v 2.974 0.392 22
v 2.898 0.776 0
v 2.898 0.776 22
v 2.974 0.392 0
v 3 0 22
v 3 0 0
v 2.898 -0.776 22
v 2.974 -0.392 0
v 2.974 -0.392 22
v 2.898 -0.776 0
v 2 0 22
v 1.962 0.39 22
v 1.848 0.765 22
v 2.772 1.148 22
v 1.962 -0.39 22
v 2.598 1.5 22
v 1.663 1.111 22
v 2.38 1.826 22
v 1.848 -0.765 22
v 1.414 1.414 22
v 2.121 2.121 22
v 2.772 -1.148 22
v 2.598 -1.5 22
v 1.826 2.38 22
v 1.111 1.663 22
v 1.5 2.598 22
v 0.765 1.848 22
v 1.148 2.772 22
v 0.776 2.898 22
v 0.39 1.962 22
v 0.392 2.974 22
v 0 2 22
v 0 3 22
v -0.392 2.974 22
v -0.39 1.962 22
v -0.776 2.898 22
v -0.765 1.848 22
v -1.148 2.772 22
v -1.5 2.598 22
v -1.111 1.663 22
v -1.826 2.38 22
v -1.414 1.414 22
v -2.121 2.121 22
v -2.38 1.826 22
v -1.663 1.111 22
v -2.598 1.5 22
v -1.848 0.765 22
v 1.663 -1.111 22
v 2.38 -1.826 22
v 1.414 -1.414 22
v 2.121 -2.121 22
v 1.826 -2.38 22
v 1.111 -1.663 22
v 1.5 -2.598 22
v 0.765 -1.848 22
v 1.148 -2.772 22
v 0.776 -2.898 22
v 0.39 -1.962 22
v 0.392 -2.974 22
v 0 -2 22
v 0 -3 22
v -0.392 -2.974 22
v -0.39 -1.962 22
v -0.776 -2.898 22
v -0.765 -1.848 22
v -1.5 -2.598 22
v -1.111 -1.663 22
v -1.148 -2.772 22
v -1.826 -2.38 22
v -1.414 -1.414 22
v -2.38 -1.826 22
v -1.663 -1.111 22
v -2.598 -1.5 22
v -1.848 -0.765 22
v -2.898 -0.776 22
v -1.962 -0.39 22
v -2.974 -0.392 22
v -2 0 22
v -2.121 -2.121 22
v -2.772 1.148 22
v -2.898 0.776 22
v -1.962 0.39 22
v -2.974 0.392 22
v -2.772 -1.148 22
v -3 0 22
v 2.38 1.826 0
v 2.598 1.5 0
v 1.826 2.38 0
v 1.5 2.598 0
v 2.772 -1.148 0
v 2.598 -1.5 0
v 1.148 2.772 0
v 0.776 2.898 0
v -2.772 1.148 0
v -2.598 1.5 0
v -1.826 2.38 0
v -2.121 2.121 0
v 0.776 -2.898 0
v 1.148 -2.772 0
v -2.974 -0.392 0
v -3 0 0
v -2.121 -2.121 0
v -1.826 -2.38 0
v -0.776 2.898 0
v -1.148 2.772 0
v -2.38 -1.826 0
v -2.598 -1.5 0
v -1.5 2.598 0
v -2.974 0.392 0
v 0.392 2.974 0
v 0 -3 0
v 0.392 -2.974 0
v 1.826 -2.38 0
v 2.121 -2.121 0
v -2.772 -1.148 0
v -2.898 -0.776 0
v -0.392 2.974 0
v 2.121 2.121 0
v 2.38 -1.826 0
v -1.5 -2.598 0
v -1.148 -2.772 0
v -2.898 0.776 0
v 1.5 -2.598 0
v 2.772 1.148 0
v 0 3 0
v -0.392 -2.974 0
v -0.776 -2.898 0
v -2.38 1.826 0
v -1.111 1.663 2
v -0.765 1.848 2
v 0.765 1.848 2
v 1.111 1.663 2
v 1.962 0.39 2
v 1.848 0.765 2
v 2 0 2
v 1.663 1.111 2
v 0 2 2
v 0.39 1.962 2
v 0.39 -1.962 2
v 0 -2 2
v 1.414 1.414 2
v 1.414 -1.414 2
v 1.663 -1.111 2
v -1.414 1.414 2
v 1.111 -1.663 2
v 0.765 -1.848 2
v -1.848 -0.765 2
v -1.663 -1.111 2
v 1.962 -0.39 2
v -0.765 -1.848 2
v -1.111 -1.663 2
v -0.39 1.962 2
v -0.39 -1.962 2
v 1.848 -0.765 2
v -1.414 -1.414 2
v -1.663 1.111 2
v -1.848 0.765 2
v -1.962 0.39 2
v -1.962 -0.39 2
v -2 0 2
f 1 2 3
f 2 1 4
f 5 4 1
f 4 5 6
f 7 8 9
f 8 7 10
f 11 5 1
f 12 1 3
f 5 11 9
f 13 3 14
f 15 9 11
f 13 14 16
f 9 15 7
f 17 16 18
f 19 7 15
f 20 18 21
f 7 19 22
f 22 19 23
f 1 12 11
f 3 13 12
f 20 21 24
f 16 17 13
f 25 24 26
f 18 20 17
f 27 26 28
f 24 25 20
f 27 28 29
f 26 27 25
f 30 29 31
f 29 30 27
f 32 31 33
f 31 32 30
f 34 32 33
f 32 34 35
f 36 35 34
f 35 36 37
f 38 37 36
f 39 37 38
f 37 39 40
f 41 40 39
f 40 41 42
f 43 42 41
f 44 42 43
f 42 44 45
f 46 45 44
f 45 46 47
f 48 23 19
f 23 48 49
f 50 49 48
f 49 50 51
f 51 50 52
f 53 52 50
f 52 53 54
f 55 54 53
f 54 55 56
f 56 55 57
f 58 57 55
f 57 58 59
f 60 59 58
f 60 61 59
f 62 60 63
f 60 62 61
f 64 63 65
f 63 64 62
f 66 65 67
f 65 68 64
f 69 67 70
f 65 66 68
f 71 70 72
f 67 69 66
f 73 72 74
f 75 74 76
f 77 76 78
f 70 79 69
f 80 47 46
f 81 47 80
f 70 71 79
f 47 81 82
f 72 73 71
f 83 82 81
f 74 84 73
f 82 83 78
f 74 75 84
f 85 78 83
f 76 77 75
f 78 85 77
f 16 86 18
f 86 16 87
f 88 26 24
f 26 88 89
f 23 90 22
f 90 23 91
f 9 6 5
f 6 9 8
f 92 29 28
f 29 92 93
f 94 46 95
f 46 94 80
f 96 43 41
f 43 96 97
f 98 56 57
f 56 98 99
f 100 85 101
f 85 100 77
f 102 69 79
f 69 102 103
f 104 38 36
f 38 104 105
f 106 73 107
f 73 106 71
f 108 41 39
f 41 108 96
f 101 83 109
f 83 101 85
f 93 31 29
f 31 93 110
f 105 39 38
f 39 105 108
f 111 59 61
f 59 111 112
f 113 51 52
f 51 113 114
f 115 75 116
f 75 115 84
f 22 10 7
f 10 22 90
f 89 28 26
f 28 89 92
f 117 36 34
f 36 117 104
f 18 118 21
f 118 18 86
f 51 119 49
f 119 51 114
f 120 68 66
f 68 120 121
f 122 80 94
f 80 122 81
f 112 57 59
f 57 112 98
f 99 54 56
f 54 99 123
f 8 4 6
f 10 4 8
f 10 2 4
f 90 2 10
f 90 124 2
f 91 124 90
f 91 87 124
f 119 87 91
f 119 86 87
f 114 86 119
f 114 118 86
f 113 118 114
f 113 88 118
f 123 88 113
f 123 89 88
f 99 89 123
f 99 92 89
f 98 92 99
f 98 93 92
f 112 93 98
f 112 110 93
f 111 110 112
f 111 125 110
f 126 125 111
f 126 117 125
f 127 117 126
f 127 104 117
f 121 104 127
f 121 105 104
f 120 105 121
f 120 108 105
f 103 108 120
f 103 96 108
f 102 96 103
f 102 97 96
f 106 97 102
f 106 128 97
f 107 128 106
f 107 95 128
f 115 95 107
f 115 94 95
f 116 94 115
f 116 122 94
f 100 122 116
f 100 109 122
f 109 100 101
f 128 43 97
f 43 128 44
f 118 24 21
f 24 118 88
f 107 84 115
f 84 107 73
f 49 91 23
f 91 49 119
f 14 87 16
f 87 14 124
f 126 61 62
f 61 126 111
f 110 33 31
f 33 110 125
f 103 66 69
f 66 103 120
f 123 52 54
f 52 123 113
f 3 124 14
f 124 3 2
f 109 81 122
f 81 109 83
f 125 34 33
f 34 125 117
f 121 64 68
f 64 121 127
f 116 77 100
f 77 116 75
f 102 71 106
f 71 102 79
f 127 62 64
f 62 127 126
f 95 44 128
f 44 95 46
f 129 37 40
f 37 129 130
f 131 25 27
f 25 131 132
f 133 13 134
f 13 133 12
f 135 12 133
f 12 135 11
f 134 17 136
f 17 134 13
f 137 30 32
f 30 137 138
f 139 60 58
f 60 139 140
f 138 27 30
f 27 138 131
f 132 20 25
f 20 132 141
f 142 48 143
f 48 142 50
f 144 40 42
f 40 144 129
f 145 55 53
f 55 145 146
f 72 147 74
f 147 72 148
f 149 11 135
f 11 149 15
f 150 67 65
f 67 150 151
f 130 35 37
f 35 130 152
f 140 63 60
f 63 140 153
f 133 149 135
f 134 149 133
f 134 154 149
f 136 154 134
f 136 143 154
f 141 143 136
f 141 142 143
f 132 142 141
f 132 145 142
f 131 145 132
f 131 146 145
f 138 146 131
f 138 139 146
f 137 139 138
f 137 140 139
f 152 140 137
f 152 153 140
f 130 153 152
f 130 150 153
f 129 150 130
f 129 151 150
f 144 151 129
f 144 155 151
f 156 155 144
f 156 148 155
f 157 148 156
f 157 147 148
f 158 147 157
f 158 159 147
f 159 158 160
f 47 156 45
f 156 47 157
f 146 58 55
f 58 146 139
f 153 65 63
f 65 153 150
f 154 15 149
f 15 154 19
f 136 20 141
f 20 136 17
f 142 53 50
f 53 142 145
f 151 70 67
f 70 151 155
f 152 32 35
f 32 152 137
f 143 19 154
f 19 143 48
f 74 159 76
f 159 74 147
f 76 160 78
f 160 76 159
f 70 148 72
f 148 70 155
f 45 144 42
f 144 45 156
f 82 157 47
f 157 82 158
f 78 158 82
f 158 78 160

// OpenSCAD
// joint insulator
$fs = 0.4;
$fa = 1;

id = 4;
length = 22;
od = 6;
base = 2;

difference() {
  cylinder(d=od,h=length);
  translate([0,0,base])
  cylinder(d=id,h=length);
}
